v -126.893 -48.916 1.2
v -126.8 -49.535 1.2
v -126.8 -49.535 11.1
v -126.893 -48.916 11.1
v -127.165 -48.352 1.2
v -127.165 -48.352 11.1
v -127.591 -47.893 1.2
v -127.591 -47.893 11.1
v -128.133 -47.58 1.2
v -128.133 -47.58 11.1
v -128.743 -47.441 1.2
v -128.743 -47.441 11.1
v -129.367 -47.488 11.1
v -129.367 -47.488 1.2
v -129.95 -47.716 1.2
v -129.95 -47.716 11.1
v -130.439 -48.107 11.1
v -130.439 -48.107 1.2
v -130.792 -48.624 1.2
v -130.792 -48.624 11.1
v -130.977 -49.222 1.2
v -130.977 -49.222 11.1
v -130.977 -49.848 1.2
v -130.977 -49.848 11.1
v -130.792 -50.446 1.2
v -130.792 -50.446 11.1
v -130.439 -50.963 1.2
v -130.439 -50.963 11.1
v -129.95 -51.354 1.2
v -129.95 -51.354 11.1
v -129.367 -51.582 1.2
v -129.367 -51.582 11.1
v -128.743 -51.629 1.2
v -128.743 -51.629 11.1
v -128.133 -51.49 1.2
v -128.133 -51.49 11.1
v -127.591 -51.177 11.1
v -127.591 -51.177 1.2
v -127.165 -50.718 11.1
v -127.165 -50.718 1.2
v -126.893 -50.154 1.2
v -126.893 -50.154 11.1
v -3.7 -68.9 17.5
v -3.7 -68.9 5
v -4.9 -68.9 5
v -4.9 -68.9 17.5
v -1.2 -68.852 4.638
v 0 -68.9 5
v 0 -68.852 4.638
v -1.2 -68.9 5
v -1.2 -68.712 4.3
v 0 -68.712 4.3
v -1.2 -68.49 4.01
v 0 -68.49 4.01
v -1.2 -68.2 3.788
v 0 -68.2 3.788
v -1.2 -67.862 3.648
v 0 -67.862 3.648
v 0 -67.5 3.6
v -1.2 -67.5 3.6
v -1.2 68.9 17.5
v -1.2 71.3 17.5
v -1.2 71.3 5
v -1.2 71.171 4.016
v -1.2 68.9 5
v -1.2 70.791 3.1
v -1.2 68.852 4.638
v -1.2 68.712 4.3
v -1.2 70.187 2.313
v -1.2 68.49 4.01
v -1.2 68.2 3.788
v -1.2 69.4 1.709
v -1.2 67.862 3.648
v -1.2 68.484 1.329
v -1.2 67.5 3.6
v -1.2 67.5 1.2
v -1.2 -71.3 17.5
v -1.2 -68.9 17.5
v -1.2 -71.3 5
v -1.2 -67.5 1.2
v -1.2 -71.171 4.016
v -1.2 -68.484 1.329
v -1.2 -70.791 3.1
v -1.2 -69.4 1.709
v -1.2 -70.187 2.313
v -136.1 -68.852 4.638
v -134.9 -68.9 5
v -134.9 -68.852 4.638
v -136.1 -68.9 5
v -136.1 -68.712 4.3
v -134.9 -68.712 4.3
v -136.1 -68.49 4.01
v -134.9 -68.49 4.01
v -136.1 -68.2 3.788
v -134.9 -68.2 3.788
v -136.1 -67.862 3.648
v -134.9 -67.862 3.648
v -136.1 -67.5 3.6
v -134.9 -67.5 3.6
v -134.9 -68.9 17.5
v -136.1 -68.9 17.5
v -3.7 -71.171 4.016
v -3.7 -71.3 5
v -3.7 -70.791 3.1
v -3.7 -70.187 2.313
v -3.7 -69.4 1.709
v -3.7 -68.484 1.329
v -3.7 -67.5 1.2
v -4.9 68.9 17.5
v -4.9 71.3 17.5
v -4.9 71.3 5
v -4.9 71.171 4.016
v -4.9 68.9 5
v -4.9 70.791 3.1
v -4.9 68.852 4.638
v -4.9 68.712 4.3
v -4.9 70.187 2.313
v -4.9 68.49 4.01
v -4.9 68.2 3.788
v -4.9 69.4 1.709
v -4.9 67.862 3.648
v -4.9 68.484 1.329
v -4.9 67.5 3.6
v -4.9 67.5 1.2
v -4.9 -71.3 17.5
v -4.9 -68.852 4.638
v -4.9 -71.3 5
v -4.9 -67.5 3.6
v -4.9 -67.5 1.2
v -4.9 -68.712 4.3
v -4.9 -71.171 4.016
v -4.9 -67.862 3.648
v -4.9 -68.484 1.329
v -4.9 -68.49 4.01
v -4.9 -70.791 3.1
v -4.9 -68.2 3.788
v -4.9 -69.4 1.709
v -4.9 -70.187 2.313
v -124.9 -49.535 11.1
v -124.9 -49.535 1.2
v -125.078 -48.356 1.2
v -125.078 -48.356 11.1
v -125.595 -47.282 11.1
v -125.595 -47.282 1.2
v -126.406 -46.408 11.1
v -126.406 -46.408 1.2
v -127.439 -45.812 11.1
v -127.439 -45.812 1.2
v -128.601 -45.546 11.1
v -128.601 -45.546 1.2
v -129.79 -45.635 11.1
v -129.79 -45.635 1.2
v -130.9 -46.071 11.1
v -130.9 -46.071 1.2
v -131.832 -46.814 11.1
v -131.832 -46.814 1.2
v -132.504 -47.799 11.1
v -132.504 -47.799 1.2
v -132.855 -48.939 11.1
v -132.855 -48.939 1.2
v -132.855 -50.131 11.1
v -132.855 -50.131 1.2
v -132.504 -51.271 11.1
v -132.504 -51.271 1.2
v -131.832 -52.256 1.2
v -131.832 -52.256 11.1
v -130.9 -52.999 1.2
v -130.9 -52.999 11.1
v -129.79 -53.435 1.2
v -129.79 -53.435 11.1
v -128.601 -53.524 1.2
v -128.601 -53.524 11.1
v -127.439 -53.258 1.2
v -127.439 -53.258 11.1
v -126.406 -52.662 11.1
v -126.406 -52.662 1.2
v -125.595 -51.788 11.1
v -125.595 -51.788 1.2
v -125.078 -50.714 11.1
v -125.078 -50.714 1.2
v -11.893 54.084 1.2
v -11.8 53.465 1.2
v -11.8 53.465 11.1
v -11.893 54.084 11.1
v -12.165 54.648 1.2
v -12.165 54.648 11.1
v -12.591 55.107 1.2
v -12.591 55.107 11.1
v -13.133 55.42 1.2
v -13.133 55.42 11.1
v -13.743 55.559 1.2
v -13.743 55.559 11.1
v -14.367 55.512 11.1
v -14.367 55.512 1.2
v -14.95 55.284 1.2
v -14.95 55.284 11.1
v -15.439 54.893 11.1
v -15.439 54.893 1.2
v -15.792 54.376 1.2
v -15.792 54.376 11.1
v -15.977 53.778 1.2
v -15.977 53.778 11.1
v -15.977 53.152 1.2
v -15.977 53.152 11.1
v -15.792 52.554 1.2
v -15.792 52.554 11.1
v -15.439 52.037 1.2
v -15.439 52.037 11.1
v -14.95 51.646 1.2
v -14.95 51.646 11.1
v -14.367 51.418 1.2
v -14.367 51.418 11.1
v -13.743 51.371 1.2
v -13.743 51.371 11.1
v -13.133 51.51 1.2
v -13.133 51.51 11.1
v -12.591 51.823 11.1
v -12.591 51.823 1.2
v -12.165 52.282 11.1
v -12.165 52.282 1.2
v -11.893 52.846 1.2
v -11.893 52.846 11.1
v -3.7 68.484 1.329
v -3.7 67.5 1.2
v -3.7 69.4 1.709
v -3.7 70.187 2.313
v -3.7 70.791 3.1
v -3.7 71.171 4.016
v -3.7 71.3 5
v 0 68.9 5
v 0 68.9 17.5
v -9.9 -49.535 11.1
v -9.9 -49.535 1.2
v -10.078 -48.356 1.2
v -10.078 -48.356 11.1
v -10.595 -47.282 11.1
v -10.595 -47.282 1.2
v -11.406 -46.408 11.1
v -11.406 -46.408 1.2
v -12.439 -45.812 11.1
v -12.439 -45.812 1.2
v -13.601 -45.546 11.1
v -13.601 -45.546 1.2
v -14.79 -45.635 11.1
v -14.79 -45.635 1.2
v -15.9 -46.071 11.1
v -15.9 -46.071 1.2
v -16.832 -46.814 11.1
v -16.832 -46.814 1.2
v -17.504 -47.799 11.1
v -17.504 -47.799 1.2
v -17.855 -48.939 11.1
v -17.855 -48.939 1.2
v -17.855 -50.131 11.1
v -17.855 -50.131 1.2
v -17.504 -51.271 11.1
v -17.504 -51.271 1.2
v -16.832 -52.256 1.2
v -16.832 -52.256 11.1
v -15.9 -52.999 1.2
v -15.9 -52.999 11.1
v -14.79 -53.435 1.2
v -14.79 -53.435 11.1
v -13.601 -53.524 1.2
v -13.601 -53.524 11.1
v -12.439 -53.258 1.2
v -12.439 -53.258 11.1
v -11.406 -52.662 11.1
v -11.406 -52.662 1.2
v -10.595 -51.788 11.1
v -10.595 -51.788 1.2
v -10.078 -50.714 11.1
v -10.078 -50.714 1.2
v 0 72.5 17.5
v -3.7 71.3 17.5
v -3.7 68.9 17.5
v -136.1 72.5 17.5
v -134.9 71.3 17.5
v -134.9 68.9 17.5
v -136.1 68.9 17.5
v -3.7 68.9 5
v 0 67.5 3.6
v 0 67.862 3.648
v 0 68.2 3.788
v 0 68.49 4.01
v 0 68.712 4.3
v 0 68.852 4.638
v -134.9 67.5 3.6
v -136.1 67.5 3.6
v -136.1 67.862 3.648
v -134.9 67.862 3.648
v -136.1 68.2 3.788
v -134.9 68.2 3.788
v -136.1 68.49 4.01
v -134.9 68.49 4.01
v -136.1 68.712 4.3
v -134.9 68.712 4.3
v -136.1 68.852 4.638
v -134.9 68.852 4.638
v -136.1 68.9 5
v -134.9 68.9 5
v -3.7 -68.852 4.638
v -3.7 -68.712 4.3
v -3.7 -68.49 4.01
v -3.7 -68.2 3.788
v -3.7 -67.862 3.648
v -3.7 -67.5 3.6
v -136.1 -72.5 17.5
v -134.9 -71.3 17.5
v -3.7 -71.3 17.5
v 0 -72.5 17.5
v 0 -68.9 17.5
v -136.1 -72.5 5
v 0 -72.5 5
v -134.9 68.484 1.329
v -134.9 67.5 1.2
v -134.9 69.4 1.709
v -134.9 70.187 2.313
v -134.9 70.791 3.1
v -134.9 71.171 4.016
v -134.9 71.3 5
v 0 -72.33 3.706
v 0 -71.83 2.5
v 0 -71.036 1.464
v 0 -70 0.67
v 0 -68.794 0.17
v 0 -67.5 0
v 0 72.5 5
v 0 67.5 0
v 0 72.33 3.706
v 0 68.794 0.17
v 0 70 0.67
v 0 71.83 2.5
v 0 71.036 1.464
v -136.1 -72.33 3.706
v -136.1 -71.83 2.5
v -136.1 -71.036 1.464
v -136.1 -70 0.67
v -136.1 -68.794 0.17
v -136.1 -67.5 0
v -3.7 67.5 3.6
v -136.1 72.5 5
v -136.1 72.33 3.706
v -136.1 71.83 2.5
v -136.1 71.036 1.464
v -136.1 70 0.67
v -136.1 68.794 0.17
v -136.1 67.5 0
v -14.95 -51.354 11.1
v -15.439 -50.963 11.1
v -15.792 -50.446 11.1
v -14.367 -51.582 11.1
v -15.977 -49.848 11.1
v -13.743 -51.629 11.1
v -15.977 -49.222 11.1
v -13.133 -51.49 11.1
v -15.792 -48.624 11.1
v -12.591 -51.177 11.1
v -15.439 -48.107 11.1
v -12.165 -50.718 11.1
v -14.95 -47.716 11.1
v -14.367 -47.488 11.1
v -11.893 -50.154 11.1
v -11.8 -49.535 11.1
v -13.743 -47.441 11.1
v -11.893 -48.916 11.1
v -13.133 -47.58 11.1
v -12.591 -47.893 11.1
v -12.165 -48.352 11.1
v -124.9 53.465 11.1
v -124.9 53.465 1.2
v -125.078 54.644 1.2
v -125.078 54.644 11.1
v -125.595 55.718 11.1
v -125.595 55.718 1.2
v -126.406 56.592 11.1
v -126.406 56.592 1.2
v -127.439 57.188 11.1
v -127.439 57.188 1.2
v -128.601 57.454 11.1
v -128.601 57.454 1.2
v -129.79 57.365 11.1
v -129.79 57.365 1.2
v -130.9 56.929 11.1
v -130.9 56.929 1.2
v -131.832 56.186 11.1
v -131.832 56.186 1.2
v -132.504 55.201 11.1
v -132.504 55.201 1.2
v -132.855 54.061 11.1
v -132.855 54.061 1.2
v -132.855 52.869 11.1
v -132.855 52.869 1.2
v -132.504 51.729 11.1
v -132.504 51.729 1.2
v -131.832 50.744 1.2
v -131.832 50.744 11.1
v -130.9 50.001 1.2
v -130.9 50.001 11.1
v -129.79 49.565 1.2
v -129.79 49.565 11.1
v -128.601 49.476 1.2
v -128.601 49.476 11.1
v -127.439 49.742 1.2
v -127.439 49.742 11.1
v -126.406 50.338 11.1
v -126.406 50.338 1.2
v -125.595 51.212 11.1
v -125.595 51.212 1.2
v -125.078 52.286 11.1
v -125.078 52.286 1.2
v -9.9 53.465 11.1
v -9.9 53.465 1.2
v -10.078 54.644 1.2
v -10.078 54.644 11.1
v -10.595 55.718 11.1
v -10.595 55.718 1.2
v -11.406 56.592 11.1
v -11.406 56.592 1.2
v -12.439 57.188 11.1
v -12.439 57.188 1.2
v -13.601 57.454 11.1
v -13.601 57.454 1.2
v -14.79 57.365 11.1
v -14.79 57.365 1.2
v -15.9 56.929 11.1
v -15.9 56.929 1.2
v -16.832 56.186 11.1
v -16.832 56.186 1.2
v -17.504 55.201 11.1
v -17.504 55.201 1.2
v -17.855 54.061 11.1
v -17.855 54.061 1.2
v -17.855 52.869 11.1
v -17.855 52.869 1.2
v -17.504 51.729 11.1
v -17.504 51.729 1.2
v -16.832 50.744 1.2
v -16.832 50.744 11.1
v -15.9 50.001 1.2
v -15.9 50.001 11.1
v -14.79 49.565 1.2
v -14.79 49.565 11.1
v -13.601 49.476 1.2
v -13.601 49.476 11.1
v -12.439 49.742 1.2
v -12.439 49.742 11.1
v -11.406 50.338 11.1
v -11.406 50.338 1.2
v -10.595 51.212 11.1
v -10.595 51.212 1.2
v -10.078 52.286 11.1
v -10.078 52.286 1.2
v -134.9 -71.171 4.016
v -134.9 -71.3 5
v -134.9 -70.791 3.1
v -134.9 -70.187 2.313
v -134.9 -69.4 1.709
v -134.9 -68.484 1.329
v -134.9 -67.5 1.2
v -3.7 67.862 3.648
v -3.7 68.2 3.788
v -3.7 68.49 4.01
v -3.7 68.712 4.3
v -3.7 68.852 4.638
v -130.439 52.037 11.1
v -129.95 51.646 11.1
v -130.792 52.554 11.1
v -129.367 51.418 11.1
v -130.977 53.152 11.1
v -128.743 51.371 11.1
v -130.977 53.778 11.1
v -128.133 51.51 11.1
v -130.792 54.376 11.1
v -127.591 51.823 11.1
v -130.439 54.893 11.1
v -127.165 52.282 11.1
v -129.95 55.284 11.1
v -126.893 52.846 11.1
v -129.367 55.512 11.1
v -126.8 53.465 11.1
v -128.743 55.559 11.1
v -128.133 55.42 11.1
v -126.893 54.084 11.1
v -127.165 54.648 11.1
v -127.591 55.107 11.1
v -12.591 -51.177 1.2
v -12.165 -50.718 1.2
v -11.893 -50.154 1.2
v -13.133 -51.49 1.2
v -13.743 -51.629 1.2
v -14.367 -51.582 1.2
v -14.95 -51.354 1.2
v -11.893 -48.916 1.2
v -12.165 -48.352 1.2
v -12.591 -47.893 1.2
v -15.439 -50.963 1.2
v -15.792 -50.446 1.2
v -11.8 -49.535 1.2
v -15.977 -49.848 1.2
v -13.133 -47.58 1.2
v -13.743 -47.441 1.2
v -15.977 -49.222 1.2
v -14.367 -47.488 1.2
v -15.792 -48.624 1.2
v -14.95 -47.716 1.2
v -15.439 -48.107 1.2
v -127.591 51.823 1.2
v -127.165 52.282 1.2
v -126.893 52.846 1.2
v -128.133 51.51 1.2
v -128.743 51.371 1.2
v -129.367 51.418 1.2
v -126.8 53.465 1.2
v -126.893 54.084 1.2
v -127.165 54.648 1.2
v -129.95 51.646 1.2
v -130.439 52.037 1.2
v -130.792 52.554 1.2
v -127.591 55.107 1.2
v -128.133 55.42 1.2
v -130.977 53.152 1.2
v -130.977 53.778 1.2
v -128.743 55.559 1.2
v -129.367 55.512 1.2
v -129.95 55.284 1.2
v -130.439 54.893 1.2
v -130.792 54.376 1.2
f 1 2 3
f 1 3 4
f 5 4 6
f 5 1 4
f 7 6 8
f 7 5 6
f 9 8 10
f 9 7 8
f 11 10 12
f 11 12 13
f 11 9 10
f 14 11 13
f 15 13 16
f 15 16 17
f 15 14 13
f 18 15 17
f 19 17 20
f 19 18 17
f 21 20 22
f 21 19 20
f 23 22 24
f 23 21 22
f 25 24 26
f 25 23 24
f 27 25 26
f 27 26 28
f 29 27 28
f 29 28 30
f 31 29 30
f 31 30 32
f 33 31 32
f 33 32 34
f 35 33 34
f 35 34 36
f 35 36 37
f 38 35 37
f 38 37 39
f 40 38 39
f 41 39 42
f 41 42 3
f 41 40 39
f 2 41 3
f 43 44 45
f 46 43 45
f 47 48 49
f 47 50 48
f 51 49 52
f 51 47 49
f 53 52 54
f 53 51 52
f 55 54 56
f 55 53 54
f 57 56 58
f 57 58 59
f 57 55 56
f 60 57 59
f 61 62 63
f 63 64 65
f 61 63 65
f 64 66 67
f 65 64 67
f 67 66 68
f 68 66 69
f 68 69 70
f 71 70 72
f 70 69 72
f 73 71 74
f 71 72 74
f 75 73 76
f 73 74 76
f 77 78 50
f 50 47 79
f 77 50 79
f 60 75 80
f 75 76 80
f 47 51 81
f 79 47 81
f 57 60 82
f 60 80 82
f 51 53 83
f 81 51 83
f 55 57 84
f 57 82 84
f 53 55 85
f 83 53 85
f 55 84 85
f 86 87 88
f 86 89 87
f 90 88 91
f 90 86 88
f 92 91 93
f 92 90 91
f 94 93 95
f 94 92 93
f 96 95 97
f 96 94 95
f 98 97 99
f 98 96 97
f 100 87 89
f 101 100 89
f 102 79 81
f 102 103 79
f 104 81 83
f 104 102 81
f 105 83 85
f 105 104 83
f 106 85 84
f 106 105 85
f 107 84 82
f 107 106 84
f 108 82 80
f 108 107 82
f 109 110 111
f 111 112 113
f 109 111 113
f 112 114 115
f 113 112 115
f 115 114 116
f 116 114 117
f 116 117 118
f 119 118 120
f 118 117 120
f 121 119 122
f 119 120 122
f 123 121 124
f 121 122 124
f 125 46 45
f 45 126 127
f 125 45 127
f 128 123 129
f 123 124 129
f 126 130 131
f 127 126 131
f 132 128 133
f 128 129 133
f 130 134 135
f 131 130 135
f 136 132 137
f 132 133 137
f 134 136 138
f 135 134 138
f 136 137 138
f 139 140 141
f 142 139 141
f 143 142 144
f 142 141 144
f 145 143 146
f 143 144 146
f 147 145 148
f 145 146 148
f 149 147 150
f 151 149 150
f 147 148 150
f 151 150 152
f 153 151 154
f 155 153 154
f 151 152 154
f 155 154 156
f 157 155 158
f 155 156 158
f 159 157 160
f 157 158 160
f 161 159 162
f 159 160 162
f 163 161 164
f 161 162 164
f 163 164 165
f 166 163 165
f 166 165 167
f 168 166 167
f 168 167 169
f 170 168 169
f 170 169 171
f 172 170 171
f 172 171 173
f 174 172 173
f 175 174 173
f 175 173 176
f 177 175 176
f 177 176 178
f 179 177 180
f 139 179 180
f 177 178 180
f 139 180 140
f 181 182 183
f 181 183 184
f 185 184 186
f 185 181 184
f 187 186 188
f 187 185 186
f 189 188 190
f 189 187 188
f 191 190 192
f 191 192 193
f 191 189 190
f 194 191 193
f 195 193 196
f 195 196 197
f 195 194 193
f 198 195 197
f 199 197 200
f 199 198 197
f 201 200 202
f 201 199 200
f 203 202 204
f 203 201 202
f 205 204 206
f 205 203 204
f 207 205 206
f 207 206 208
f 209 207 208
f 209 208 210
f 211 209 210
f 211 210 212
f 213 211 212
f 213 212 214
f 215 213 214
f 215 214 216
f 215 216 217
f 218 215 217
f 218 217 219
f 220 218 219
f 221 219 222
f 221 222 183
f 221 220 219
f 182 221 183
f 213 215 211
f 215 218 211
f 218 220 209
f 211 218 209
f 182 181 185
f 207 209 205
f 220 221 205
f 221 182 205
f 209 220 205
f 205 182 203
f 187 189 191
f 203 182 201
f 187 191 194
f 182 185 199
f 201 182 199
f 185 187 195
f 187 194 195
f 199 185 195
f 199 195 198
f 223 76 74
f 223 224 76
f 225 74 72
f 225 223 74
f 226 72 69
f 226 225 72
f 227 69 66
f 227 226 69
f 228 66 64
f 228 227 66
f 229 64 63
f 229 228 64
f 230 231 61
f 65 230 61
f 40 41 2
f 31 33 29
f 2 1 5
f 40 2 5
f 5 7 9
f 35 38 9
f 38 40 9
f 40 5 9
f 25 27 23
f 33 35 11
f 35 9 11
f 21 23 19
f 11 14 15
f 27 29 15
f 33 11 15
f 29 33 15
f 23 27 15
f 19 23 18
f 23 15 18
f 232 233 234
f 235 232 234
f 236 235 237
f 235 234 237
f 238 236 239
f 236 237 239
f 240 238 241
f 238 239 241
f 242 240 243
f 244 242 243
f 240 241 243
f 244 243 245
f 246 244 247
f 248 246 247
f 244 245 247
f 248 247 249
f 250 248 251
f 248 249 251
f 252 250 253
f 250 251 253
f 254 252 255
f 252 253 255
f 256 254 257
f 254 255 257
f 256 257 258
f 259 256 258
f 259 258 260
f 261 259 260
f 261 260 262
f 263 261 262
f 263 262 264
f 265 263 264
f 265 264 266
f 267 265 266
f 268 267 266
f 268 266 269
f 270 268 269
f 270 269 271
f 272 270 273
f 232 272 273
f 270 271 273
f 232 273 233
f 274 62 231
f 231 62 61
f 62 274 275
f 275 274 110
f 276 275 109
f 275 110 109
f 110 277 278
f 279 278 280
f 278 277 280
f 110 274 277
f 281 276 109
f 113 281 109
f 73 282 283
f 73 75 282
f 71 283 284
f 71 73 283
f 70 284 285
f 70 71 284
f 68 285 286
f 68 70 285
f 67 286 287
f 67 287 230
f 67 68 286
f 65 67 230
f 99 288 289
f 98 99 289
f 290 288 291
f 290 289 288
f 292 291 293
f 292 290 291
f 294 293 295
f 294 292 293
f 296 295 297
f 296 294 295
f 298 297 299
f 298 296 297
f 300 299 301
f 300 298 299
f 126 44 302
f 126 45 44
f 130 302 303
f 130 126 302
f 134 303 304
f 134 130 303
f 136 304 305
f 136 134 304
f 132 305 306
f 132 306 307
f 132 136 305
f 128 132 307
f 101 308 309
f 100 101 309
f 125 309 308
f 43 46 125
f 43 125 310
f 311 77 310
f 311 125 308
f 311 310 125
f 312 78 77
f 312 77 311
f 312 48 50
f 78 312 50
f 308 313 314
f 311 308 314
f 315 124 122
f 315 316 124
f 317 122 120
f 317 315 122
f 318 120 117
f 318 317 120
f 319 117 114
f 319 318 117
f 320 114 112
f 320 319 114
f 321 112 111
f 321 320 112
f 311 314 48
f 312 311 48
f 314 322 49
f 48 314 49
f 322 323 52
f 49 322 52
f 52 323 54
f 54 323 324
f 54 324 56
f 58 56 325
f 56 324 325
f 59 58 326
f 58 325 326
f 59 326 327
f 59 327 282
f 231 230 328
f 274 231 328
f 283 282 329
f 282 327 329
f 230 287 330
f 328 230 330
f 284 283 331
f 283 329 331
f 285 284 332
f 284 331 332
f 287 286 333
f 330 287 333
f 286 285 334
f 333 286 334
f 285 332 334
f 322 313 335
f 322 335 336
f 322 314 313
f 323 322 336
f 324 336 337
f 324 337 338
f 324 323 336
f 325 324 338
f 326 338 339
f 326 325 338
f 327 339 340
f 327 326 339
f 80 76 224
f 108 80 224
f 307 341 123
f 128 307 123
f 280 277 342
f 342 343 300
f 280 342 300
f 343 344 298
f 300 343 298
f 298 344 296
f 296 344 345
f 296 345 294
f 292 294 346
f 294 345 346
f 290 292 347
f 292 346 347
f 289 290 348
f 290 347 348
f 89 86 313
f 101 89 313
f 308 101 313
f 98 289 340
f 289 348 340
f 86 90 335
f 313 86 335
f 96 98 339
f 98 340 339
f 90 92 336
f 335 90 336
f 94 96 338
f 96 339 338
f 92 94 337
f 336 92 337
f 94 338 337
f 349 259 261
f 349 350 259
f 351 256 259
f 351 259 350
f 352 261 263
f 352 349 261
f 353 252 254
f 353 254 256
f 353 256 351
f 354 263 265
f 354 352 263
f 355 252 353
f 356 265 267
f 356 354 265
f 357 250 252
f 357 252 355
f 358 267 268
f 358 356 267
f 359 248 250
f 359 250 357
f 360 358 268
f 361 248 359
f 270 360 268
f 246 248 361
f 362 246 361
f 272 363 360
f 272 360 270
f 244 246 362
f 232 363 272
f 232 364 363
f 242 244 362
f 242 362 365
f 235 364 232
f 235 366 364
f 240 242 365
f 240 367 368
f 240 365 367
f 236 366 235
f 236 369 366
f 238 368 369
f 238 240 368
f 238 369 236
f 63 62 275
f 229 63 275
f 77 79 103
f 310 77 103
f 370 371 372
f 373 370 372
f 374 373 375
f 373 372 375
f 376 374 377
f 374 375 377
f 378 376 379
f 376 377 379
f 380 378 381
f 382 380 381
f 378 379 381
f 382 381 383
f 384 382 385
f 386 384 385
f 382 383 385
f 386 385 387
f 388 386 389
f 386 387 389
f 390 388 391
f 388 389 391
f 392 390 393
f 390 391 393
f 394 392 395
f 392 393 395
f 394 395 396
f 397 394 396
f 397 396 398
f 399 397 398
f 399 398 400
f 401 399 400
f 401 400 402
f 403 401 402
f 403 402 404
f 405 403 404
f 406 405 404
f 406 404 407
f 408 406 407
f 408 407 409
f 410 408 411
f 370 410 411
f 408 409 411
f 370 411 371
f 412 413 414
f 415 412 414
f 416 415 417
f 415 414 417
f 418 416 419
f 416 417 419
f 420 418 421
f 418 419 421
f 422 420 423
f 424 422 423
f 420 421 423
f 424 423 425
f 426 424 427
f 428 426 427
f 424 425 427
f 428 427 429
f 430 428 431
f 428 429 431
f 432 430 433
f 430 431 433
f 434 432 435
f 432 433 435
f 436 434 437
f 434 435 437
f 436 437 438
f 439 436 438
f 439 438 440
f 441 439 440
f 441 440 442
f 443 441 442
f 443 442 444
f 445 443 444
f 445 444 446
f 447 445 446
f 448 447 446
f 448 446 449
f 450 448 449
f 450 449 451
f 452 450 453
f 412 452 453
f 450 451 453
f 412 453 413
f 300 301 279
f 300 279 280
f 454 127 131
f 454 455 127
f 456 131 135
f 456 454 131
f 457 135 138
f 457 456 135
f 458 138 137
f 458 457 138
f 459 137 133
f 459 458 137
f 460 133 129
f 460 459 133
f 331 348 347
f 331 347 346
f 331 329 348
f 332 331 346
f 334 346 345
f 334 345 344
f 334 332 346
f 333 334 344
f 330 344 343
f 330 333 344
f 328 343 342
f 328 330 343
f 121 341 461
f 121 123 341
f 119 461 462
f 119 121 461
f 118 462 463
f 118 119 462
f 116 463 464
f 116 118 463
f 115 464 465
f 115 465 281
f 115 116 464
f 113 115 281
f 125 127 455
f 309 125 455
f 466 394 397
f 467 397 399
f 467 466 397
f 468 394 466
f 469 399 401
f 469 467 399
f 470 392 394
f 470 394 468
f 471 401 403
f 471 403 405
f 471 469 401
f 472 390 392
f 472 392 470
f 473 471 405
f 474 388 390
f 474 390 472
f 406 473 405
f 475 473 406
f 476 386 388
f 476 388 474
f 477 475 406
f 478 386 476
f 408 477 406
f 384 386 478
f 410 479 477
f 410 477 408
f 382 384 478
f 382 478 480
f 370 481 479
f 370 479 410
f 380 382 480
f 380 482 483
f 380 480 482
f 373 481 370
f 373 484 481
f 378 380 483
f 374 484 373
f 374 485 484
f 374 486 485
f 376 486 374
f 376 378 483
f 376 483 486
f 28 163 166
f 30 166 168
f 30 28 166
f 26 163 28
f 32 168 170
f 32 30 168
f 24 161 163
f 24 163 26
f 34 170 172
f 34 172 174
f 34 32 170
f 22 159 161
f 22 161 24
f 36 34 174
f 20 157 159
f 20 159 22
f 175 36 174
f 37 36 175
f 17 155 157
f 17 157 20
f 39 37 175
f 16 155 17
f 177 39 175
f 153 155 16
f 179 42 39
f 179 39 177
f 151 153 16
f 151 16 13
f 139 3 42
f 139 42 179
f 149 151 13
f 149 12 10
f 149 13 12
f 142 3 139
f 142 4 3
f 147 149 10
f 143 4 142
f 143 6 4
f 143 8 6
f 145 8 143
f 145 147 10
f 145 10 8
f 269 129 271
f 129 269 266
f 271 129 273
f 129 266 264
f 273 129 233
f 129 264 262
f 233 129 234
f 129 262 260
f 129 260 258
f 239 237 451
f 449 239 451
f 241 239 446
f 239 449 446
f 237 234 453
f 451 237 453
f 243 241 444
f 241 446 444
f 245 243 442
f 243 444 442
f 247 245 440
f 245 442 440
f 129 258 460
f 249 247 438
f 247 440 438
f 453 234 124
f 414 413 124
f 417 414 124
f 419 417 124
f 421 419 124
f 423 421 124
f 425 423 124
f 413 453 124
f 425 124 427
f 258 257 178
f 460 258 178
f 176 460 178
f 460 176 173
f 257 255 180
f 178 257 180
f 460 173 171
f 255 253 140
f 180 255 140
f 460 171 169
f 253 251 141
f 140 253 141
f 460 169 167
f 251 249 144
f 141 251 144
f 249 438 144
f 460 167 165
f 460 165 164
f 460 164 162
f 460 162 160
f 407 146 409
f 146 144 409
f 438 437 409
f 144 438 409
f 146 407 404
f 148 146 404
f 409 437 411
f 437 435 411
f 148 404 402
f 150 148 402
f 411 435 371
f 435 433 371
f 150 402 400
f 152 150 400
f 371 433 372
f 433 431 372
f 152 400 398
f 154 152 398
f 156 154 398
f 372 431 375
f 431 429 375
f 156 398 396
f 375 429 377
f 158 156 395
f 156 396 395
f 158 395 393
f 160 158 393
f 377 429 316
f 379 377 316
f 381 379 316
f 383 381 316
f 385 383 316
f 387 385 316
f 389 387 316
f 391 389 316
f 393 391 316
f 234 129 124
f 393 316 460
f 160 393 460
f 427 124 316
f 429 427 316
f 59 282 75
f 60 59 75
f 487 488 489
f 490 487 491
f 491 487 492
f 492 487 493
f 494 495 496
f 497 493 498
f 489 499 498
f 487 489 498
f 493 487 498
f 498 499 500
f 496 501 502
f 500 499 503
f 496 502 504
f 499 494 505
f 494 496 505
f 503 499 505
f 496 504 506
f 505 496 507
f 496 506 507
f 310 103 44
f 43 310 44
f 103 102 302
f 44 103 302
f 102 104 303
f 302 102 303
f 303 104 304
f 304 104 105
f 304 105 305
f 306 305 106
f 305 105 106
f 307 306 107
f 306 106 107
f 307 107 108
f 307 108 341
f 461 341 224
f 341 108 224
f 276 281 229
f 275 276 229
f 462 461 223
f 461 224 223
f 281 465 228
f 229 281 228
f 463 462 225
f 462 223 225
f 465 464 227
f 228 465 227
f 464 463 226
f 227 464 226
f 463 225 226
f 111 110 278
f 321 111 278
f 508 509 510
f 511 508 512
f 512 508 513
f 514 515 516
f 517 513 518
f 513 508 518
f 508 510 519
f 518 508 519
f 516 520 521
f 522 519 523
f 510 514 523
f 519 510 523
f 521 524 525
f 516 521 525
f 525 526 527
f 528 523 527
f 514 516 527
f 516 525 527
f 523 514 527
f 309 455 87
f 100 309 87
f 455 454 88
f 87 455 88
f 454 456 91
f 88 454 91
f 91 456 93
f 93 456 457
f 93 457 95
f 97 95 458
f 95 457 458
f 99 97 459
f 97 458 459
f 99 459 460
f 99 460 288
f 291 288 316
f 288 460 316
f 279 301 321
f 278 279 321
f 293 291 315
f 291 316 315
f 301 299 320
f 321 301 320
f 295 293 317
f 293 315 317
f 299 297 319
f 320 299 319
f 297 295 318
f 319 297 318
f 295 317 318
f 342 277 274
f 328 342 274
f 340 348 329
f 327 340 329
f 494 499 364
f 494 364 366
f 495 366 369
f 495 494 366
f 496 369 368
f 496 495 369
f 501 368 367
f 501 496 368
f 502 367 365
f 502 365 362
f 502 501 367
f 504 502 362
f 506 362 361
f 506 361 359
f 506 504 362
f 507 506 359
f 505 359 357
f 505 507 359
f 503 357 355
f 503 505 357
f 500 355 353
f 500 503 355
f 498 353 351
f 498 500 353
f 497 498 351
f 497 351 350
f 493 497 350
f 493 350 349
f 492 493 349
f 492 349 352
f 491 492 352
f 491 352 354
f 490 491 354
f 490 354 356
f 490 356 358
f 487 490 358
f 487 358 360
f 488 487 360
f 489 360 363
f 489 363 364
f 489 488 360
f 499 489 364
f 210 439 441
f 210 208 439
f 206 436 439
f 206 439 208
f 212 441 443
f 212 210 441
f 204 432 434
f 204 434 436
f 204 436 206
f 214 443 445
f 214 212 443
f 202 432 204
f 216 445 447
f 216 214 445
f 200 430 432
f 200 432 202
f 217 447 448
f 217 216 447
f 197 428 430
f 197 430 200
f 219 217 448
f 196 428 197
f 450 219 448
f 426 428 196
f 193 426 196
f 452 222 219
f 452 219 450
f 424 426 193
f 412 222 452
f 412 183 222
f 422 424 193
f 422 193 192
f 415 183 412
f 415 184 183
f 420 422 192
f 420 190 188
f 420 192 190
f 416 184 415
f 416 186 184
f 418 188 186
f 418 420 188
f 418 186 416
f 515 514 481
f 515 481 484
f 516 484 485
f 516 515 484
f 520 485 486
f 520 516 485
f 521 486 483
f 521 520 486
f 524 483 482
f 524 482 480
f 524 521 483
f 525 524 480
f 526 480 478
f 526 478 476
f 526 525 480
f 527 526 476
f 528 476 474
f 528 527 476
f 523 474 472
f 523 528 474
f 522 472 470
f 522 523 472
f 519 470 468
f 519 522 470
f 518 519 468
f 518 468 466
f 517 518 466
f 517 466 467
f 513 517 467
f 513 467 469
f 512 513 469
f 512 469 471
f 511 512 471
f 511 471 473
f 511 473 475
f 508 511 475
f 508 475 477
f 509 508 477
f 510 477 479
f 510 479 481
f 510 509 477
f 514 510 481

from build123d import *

# Parameters (mm, degrees)
SKETCH002_R                   = 4
SKETCH002_R_2                 = 2.1
PAD_DEPTH                     = 9.9
SKETCH002_LINEARPATTERN_2_R   = 4
SKETCH002_LINEARPATTERN_2_R_2 = 2.1
PAD_LINEARPATTERN_2_DEPTH     = 9.9
LINEARPATTERN001_COUNT        = 2
LINEARPATTERN001_PITCH        = 103


with BuildPart() as part:
    # AdditivePipe: sweep along a path in Sketch
    with BuildLine(Plane.YZ) as additivepipe_path:
        Line((-72.5, 17.5), (-72.5, 5))
        ThreePointArc((-72.5, 5), (-71.035534, 1.464466), (-67.5, 0))
        Line((-67.5, 0), (67.5, 0))
        ThreePointArc((67.5, 0), (71.035534, 1.464466), (72.5, 5))
        Line((72.5, 5), (72.5, 17.5))
    # Sketch001 → AdditivePipe (sweep)
    with BuildSketch(Plane.XY.offset(17.5)):
        Polygon((0, -72.5), (-136.1, -72.5), (-136.1, -68.9), (-134.9, -68.9), (-134.9, -71.3), (-4.9, -71.3), (-4.9, -68.9), (-3.7, -68.9), (-3.7, -71.3), (-1.2, -71.3), (-1.2, -68.9), (0, -68.9), align=None)
    sweep(path=additivepipe_path.line)

    # Sketch002 → Pad (new body)
    with BuildSketch(Plane.XY.offset(1.2)):
        with Locations((-128.9, -49.535)):
            Circle(SKETCH002_R)
        with Locations((-128.9, -49.535)):
            Circle(SKETCH002_R_2, mode=Mode.SUBTRACT)
    pad = extrude(amount=PAD_DEPTH)

    # Sketch002 LinearPattern 2 → Pad LinearPattern 2 (add)
    with BuildSketch(Plane(origin=(115, 0, 1.2), x_dir=(1, 0, 0), z_dir=(0, 0, 1))):
        with Locations((-128.9, -49.535)):
            Circle(SKETCH002_LINEARPATTERN_2_R)
        with Locations((-128.9, -49.535)):
            Circle(SKETCH002_LINEARPATTERN_2_R_2, mode=Mode.SUBTRACT)
    pad_linearpattern_2 = extrude(amount=PAD_LINEARPATTERN_2_DEPTH)

    # LinearPattern001: Pad, Pad LinearPattern 2 ×2
    with Locations(*[(0, i * LINEARPATTERN001_PITCH, 0) for i in range(1, LINEARPATTERN001_COUNT)]):
        add(pad)
        add(pad_linearpattern_2)


solid = part.part
